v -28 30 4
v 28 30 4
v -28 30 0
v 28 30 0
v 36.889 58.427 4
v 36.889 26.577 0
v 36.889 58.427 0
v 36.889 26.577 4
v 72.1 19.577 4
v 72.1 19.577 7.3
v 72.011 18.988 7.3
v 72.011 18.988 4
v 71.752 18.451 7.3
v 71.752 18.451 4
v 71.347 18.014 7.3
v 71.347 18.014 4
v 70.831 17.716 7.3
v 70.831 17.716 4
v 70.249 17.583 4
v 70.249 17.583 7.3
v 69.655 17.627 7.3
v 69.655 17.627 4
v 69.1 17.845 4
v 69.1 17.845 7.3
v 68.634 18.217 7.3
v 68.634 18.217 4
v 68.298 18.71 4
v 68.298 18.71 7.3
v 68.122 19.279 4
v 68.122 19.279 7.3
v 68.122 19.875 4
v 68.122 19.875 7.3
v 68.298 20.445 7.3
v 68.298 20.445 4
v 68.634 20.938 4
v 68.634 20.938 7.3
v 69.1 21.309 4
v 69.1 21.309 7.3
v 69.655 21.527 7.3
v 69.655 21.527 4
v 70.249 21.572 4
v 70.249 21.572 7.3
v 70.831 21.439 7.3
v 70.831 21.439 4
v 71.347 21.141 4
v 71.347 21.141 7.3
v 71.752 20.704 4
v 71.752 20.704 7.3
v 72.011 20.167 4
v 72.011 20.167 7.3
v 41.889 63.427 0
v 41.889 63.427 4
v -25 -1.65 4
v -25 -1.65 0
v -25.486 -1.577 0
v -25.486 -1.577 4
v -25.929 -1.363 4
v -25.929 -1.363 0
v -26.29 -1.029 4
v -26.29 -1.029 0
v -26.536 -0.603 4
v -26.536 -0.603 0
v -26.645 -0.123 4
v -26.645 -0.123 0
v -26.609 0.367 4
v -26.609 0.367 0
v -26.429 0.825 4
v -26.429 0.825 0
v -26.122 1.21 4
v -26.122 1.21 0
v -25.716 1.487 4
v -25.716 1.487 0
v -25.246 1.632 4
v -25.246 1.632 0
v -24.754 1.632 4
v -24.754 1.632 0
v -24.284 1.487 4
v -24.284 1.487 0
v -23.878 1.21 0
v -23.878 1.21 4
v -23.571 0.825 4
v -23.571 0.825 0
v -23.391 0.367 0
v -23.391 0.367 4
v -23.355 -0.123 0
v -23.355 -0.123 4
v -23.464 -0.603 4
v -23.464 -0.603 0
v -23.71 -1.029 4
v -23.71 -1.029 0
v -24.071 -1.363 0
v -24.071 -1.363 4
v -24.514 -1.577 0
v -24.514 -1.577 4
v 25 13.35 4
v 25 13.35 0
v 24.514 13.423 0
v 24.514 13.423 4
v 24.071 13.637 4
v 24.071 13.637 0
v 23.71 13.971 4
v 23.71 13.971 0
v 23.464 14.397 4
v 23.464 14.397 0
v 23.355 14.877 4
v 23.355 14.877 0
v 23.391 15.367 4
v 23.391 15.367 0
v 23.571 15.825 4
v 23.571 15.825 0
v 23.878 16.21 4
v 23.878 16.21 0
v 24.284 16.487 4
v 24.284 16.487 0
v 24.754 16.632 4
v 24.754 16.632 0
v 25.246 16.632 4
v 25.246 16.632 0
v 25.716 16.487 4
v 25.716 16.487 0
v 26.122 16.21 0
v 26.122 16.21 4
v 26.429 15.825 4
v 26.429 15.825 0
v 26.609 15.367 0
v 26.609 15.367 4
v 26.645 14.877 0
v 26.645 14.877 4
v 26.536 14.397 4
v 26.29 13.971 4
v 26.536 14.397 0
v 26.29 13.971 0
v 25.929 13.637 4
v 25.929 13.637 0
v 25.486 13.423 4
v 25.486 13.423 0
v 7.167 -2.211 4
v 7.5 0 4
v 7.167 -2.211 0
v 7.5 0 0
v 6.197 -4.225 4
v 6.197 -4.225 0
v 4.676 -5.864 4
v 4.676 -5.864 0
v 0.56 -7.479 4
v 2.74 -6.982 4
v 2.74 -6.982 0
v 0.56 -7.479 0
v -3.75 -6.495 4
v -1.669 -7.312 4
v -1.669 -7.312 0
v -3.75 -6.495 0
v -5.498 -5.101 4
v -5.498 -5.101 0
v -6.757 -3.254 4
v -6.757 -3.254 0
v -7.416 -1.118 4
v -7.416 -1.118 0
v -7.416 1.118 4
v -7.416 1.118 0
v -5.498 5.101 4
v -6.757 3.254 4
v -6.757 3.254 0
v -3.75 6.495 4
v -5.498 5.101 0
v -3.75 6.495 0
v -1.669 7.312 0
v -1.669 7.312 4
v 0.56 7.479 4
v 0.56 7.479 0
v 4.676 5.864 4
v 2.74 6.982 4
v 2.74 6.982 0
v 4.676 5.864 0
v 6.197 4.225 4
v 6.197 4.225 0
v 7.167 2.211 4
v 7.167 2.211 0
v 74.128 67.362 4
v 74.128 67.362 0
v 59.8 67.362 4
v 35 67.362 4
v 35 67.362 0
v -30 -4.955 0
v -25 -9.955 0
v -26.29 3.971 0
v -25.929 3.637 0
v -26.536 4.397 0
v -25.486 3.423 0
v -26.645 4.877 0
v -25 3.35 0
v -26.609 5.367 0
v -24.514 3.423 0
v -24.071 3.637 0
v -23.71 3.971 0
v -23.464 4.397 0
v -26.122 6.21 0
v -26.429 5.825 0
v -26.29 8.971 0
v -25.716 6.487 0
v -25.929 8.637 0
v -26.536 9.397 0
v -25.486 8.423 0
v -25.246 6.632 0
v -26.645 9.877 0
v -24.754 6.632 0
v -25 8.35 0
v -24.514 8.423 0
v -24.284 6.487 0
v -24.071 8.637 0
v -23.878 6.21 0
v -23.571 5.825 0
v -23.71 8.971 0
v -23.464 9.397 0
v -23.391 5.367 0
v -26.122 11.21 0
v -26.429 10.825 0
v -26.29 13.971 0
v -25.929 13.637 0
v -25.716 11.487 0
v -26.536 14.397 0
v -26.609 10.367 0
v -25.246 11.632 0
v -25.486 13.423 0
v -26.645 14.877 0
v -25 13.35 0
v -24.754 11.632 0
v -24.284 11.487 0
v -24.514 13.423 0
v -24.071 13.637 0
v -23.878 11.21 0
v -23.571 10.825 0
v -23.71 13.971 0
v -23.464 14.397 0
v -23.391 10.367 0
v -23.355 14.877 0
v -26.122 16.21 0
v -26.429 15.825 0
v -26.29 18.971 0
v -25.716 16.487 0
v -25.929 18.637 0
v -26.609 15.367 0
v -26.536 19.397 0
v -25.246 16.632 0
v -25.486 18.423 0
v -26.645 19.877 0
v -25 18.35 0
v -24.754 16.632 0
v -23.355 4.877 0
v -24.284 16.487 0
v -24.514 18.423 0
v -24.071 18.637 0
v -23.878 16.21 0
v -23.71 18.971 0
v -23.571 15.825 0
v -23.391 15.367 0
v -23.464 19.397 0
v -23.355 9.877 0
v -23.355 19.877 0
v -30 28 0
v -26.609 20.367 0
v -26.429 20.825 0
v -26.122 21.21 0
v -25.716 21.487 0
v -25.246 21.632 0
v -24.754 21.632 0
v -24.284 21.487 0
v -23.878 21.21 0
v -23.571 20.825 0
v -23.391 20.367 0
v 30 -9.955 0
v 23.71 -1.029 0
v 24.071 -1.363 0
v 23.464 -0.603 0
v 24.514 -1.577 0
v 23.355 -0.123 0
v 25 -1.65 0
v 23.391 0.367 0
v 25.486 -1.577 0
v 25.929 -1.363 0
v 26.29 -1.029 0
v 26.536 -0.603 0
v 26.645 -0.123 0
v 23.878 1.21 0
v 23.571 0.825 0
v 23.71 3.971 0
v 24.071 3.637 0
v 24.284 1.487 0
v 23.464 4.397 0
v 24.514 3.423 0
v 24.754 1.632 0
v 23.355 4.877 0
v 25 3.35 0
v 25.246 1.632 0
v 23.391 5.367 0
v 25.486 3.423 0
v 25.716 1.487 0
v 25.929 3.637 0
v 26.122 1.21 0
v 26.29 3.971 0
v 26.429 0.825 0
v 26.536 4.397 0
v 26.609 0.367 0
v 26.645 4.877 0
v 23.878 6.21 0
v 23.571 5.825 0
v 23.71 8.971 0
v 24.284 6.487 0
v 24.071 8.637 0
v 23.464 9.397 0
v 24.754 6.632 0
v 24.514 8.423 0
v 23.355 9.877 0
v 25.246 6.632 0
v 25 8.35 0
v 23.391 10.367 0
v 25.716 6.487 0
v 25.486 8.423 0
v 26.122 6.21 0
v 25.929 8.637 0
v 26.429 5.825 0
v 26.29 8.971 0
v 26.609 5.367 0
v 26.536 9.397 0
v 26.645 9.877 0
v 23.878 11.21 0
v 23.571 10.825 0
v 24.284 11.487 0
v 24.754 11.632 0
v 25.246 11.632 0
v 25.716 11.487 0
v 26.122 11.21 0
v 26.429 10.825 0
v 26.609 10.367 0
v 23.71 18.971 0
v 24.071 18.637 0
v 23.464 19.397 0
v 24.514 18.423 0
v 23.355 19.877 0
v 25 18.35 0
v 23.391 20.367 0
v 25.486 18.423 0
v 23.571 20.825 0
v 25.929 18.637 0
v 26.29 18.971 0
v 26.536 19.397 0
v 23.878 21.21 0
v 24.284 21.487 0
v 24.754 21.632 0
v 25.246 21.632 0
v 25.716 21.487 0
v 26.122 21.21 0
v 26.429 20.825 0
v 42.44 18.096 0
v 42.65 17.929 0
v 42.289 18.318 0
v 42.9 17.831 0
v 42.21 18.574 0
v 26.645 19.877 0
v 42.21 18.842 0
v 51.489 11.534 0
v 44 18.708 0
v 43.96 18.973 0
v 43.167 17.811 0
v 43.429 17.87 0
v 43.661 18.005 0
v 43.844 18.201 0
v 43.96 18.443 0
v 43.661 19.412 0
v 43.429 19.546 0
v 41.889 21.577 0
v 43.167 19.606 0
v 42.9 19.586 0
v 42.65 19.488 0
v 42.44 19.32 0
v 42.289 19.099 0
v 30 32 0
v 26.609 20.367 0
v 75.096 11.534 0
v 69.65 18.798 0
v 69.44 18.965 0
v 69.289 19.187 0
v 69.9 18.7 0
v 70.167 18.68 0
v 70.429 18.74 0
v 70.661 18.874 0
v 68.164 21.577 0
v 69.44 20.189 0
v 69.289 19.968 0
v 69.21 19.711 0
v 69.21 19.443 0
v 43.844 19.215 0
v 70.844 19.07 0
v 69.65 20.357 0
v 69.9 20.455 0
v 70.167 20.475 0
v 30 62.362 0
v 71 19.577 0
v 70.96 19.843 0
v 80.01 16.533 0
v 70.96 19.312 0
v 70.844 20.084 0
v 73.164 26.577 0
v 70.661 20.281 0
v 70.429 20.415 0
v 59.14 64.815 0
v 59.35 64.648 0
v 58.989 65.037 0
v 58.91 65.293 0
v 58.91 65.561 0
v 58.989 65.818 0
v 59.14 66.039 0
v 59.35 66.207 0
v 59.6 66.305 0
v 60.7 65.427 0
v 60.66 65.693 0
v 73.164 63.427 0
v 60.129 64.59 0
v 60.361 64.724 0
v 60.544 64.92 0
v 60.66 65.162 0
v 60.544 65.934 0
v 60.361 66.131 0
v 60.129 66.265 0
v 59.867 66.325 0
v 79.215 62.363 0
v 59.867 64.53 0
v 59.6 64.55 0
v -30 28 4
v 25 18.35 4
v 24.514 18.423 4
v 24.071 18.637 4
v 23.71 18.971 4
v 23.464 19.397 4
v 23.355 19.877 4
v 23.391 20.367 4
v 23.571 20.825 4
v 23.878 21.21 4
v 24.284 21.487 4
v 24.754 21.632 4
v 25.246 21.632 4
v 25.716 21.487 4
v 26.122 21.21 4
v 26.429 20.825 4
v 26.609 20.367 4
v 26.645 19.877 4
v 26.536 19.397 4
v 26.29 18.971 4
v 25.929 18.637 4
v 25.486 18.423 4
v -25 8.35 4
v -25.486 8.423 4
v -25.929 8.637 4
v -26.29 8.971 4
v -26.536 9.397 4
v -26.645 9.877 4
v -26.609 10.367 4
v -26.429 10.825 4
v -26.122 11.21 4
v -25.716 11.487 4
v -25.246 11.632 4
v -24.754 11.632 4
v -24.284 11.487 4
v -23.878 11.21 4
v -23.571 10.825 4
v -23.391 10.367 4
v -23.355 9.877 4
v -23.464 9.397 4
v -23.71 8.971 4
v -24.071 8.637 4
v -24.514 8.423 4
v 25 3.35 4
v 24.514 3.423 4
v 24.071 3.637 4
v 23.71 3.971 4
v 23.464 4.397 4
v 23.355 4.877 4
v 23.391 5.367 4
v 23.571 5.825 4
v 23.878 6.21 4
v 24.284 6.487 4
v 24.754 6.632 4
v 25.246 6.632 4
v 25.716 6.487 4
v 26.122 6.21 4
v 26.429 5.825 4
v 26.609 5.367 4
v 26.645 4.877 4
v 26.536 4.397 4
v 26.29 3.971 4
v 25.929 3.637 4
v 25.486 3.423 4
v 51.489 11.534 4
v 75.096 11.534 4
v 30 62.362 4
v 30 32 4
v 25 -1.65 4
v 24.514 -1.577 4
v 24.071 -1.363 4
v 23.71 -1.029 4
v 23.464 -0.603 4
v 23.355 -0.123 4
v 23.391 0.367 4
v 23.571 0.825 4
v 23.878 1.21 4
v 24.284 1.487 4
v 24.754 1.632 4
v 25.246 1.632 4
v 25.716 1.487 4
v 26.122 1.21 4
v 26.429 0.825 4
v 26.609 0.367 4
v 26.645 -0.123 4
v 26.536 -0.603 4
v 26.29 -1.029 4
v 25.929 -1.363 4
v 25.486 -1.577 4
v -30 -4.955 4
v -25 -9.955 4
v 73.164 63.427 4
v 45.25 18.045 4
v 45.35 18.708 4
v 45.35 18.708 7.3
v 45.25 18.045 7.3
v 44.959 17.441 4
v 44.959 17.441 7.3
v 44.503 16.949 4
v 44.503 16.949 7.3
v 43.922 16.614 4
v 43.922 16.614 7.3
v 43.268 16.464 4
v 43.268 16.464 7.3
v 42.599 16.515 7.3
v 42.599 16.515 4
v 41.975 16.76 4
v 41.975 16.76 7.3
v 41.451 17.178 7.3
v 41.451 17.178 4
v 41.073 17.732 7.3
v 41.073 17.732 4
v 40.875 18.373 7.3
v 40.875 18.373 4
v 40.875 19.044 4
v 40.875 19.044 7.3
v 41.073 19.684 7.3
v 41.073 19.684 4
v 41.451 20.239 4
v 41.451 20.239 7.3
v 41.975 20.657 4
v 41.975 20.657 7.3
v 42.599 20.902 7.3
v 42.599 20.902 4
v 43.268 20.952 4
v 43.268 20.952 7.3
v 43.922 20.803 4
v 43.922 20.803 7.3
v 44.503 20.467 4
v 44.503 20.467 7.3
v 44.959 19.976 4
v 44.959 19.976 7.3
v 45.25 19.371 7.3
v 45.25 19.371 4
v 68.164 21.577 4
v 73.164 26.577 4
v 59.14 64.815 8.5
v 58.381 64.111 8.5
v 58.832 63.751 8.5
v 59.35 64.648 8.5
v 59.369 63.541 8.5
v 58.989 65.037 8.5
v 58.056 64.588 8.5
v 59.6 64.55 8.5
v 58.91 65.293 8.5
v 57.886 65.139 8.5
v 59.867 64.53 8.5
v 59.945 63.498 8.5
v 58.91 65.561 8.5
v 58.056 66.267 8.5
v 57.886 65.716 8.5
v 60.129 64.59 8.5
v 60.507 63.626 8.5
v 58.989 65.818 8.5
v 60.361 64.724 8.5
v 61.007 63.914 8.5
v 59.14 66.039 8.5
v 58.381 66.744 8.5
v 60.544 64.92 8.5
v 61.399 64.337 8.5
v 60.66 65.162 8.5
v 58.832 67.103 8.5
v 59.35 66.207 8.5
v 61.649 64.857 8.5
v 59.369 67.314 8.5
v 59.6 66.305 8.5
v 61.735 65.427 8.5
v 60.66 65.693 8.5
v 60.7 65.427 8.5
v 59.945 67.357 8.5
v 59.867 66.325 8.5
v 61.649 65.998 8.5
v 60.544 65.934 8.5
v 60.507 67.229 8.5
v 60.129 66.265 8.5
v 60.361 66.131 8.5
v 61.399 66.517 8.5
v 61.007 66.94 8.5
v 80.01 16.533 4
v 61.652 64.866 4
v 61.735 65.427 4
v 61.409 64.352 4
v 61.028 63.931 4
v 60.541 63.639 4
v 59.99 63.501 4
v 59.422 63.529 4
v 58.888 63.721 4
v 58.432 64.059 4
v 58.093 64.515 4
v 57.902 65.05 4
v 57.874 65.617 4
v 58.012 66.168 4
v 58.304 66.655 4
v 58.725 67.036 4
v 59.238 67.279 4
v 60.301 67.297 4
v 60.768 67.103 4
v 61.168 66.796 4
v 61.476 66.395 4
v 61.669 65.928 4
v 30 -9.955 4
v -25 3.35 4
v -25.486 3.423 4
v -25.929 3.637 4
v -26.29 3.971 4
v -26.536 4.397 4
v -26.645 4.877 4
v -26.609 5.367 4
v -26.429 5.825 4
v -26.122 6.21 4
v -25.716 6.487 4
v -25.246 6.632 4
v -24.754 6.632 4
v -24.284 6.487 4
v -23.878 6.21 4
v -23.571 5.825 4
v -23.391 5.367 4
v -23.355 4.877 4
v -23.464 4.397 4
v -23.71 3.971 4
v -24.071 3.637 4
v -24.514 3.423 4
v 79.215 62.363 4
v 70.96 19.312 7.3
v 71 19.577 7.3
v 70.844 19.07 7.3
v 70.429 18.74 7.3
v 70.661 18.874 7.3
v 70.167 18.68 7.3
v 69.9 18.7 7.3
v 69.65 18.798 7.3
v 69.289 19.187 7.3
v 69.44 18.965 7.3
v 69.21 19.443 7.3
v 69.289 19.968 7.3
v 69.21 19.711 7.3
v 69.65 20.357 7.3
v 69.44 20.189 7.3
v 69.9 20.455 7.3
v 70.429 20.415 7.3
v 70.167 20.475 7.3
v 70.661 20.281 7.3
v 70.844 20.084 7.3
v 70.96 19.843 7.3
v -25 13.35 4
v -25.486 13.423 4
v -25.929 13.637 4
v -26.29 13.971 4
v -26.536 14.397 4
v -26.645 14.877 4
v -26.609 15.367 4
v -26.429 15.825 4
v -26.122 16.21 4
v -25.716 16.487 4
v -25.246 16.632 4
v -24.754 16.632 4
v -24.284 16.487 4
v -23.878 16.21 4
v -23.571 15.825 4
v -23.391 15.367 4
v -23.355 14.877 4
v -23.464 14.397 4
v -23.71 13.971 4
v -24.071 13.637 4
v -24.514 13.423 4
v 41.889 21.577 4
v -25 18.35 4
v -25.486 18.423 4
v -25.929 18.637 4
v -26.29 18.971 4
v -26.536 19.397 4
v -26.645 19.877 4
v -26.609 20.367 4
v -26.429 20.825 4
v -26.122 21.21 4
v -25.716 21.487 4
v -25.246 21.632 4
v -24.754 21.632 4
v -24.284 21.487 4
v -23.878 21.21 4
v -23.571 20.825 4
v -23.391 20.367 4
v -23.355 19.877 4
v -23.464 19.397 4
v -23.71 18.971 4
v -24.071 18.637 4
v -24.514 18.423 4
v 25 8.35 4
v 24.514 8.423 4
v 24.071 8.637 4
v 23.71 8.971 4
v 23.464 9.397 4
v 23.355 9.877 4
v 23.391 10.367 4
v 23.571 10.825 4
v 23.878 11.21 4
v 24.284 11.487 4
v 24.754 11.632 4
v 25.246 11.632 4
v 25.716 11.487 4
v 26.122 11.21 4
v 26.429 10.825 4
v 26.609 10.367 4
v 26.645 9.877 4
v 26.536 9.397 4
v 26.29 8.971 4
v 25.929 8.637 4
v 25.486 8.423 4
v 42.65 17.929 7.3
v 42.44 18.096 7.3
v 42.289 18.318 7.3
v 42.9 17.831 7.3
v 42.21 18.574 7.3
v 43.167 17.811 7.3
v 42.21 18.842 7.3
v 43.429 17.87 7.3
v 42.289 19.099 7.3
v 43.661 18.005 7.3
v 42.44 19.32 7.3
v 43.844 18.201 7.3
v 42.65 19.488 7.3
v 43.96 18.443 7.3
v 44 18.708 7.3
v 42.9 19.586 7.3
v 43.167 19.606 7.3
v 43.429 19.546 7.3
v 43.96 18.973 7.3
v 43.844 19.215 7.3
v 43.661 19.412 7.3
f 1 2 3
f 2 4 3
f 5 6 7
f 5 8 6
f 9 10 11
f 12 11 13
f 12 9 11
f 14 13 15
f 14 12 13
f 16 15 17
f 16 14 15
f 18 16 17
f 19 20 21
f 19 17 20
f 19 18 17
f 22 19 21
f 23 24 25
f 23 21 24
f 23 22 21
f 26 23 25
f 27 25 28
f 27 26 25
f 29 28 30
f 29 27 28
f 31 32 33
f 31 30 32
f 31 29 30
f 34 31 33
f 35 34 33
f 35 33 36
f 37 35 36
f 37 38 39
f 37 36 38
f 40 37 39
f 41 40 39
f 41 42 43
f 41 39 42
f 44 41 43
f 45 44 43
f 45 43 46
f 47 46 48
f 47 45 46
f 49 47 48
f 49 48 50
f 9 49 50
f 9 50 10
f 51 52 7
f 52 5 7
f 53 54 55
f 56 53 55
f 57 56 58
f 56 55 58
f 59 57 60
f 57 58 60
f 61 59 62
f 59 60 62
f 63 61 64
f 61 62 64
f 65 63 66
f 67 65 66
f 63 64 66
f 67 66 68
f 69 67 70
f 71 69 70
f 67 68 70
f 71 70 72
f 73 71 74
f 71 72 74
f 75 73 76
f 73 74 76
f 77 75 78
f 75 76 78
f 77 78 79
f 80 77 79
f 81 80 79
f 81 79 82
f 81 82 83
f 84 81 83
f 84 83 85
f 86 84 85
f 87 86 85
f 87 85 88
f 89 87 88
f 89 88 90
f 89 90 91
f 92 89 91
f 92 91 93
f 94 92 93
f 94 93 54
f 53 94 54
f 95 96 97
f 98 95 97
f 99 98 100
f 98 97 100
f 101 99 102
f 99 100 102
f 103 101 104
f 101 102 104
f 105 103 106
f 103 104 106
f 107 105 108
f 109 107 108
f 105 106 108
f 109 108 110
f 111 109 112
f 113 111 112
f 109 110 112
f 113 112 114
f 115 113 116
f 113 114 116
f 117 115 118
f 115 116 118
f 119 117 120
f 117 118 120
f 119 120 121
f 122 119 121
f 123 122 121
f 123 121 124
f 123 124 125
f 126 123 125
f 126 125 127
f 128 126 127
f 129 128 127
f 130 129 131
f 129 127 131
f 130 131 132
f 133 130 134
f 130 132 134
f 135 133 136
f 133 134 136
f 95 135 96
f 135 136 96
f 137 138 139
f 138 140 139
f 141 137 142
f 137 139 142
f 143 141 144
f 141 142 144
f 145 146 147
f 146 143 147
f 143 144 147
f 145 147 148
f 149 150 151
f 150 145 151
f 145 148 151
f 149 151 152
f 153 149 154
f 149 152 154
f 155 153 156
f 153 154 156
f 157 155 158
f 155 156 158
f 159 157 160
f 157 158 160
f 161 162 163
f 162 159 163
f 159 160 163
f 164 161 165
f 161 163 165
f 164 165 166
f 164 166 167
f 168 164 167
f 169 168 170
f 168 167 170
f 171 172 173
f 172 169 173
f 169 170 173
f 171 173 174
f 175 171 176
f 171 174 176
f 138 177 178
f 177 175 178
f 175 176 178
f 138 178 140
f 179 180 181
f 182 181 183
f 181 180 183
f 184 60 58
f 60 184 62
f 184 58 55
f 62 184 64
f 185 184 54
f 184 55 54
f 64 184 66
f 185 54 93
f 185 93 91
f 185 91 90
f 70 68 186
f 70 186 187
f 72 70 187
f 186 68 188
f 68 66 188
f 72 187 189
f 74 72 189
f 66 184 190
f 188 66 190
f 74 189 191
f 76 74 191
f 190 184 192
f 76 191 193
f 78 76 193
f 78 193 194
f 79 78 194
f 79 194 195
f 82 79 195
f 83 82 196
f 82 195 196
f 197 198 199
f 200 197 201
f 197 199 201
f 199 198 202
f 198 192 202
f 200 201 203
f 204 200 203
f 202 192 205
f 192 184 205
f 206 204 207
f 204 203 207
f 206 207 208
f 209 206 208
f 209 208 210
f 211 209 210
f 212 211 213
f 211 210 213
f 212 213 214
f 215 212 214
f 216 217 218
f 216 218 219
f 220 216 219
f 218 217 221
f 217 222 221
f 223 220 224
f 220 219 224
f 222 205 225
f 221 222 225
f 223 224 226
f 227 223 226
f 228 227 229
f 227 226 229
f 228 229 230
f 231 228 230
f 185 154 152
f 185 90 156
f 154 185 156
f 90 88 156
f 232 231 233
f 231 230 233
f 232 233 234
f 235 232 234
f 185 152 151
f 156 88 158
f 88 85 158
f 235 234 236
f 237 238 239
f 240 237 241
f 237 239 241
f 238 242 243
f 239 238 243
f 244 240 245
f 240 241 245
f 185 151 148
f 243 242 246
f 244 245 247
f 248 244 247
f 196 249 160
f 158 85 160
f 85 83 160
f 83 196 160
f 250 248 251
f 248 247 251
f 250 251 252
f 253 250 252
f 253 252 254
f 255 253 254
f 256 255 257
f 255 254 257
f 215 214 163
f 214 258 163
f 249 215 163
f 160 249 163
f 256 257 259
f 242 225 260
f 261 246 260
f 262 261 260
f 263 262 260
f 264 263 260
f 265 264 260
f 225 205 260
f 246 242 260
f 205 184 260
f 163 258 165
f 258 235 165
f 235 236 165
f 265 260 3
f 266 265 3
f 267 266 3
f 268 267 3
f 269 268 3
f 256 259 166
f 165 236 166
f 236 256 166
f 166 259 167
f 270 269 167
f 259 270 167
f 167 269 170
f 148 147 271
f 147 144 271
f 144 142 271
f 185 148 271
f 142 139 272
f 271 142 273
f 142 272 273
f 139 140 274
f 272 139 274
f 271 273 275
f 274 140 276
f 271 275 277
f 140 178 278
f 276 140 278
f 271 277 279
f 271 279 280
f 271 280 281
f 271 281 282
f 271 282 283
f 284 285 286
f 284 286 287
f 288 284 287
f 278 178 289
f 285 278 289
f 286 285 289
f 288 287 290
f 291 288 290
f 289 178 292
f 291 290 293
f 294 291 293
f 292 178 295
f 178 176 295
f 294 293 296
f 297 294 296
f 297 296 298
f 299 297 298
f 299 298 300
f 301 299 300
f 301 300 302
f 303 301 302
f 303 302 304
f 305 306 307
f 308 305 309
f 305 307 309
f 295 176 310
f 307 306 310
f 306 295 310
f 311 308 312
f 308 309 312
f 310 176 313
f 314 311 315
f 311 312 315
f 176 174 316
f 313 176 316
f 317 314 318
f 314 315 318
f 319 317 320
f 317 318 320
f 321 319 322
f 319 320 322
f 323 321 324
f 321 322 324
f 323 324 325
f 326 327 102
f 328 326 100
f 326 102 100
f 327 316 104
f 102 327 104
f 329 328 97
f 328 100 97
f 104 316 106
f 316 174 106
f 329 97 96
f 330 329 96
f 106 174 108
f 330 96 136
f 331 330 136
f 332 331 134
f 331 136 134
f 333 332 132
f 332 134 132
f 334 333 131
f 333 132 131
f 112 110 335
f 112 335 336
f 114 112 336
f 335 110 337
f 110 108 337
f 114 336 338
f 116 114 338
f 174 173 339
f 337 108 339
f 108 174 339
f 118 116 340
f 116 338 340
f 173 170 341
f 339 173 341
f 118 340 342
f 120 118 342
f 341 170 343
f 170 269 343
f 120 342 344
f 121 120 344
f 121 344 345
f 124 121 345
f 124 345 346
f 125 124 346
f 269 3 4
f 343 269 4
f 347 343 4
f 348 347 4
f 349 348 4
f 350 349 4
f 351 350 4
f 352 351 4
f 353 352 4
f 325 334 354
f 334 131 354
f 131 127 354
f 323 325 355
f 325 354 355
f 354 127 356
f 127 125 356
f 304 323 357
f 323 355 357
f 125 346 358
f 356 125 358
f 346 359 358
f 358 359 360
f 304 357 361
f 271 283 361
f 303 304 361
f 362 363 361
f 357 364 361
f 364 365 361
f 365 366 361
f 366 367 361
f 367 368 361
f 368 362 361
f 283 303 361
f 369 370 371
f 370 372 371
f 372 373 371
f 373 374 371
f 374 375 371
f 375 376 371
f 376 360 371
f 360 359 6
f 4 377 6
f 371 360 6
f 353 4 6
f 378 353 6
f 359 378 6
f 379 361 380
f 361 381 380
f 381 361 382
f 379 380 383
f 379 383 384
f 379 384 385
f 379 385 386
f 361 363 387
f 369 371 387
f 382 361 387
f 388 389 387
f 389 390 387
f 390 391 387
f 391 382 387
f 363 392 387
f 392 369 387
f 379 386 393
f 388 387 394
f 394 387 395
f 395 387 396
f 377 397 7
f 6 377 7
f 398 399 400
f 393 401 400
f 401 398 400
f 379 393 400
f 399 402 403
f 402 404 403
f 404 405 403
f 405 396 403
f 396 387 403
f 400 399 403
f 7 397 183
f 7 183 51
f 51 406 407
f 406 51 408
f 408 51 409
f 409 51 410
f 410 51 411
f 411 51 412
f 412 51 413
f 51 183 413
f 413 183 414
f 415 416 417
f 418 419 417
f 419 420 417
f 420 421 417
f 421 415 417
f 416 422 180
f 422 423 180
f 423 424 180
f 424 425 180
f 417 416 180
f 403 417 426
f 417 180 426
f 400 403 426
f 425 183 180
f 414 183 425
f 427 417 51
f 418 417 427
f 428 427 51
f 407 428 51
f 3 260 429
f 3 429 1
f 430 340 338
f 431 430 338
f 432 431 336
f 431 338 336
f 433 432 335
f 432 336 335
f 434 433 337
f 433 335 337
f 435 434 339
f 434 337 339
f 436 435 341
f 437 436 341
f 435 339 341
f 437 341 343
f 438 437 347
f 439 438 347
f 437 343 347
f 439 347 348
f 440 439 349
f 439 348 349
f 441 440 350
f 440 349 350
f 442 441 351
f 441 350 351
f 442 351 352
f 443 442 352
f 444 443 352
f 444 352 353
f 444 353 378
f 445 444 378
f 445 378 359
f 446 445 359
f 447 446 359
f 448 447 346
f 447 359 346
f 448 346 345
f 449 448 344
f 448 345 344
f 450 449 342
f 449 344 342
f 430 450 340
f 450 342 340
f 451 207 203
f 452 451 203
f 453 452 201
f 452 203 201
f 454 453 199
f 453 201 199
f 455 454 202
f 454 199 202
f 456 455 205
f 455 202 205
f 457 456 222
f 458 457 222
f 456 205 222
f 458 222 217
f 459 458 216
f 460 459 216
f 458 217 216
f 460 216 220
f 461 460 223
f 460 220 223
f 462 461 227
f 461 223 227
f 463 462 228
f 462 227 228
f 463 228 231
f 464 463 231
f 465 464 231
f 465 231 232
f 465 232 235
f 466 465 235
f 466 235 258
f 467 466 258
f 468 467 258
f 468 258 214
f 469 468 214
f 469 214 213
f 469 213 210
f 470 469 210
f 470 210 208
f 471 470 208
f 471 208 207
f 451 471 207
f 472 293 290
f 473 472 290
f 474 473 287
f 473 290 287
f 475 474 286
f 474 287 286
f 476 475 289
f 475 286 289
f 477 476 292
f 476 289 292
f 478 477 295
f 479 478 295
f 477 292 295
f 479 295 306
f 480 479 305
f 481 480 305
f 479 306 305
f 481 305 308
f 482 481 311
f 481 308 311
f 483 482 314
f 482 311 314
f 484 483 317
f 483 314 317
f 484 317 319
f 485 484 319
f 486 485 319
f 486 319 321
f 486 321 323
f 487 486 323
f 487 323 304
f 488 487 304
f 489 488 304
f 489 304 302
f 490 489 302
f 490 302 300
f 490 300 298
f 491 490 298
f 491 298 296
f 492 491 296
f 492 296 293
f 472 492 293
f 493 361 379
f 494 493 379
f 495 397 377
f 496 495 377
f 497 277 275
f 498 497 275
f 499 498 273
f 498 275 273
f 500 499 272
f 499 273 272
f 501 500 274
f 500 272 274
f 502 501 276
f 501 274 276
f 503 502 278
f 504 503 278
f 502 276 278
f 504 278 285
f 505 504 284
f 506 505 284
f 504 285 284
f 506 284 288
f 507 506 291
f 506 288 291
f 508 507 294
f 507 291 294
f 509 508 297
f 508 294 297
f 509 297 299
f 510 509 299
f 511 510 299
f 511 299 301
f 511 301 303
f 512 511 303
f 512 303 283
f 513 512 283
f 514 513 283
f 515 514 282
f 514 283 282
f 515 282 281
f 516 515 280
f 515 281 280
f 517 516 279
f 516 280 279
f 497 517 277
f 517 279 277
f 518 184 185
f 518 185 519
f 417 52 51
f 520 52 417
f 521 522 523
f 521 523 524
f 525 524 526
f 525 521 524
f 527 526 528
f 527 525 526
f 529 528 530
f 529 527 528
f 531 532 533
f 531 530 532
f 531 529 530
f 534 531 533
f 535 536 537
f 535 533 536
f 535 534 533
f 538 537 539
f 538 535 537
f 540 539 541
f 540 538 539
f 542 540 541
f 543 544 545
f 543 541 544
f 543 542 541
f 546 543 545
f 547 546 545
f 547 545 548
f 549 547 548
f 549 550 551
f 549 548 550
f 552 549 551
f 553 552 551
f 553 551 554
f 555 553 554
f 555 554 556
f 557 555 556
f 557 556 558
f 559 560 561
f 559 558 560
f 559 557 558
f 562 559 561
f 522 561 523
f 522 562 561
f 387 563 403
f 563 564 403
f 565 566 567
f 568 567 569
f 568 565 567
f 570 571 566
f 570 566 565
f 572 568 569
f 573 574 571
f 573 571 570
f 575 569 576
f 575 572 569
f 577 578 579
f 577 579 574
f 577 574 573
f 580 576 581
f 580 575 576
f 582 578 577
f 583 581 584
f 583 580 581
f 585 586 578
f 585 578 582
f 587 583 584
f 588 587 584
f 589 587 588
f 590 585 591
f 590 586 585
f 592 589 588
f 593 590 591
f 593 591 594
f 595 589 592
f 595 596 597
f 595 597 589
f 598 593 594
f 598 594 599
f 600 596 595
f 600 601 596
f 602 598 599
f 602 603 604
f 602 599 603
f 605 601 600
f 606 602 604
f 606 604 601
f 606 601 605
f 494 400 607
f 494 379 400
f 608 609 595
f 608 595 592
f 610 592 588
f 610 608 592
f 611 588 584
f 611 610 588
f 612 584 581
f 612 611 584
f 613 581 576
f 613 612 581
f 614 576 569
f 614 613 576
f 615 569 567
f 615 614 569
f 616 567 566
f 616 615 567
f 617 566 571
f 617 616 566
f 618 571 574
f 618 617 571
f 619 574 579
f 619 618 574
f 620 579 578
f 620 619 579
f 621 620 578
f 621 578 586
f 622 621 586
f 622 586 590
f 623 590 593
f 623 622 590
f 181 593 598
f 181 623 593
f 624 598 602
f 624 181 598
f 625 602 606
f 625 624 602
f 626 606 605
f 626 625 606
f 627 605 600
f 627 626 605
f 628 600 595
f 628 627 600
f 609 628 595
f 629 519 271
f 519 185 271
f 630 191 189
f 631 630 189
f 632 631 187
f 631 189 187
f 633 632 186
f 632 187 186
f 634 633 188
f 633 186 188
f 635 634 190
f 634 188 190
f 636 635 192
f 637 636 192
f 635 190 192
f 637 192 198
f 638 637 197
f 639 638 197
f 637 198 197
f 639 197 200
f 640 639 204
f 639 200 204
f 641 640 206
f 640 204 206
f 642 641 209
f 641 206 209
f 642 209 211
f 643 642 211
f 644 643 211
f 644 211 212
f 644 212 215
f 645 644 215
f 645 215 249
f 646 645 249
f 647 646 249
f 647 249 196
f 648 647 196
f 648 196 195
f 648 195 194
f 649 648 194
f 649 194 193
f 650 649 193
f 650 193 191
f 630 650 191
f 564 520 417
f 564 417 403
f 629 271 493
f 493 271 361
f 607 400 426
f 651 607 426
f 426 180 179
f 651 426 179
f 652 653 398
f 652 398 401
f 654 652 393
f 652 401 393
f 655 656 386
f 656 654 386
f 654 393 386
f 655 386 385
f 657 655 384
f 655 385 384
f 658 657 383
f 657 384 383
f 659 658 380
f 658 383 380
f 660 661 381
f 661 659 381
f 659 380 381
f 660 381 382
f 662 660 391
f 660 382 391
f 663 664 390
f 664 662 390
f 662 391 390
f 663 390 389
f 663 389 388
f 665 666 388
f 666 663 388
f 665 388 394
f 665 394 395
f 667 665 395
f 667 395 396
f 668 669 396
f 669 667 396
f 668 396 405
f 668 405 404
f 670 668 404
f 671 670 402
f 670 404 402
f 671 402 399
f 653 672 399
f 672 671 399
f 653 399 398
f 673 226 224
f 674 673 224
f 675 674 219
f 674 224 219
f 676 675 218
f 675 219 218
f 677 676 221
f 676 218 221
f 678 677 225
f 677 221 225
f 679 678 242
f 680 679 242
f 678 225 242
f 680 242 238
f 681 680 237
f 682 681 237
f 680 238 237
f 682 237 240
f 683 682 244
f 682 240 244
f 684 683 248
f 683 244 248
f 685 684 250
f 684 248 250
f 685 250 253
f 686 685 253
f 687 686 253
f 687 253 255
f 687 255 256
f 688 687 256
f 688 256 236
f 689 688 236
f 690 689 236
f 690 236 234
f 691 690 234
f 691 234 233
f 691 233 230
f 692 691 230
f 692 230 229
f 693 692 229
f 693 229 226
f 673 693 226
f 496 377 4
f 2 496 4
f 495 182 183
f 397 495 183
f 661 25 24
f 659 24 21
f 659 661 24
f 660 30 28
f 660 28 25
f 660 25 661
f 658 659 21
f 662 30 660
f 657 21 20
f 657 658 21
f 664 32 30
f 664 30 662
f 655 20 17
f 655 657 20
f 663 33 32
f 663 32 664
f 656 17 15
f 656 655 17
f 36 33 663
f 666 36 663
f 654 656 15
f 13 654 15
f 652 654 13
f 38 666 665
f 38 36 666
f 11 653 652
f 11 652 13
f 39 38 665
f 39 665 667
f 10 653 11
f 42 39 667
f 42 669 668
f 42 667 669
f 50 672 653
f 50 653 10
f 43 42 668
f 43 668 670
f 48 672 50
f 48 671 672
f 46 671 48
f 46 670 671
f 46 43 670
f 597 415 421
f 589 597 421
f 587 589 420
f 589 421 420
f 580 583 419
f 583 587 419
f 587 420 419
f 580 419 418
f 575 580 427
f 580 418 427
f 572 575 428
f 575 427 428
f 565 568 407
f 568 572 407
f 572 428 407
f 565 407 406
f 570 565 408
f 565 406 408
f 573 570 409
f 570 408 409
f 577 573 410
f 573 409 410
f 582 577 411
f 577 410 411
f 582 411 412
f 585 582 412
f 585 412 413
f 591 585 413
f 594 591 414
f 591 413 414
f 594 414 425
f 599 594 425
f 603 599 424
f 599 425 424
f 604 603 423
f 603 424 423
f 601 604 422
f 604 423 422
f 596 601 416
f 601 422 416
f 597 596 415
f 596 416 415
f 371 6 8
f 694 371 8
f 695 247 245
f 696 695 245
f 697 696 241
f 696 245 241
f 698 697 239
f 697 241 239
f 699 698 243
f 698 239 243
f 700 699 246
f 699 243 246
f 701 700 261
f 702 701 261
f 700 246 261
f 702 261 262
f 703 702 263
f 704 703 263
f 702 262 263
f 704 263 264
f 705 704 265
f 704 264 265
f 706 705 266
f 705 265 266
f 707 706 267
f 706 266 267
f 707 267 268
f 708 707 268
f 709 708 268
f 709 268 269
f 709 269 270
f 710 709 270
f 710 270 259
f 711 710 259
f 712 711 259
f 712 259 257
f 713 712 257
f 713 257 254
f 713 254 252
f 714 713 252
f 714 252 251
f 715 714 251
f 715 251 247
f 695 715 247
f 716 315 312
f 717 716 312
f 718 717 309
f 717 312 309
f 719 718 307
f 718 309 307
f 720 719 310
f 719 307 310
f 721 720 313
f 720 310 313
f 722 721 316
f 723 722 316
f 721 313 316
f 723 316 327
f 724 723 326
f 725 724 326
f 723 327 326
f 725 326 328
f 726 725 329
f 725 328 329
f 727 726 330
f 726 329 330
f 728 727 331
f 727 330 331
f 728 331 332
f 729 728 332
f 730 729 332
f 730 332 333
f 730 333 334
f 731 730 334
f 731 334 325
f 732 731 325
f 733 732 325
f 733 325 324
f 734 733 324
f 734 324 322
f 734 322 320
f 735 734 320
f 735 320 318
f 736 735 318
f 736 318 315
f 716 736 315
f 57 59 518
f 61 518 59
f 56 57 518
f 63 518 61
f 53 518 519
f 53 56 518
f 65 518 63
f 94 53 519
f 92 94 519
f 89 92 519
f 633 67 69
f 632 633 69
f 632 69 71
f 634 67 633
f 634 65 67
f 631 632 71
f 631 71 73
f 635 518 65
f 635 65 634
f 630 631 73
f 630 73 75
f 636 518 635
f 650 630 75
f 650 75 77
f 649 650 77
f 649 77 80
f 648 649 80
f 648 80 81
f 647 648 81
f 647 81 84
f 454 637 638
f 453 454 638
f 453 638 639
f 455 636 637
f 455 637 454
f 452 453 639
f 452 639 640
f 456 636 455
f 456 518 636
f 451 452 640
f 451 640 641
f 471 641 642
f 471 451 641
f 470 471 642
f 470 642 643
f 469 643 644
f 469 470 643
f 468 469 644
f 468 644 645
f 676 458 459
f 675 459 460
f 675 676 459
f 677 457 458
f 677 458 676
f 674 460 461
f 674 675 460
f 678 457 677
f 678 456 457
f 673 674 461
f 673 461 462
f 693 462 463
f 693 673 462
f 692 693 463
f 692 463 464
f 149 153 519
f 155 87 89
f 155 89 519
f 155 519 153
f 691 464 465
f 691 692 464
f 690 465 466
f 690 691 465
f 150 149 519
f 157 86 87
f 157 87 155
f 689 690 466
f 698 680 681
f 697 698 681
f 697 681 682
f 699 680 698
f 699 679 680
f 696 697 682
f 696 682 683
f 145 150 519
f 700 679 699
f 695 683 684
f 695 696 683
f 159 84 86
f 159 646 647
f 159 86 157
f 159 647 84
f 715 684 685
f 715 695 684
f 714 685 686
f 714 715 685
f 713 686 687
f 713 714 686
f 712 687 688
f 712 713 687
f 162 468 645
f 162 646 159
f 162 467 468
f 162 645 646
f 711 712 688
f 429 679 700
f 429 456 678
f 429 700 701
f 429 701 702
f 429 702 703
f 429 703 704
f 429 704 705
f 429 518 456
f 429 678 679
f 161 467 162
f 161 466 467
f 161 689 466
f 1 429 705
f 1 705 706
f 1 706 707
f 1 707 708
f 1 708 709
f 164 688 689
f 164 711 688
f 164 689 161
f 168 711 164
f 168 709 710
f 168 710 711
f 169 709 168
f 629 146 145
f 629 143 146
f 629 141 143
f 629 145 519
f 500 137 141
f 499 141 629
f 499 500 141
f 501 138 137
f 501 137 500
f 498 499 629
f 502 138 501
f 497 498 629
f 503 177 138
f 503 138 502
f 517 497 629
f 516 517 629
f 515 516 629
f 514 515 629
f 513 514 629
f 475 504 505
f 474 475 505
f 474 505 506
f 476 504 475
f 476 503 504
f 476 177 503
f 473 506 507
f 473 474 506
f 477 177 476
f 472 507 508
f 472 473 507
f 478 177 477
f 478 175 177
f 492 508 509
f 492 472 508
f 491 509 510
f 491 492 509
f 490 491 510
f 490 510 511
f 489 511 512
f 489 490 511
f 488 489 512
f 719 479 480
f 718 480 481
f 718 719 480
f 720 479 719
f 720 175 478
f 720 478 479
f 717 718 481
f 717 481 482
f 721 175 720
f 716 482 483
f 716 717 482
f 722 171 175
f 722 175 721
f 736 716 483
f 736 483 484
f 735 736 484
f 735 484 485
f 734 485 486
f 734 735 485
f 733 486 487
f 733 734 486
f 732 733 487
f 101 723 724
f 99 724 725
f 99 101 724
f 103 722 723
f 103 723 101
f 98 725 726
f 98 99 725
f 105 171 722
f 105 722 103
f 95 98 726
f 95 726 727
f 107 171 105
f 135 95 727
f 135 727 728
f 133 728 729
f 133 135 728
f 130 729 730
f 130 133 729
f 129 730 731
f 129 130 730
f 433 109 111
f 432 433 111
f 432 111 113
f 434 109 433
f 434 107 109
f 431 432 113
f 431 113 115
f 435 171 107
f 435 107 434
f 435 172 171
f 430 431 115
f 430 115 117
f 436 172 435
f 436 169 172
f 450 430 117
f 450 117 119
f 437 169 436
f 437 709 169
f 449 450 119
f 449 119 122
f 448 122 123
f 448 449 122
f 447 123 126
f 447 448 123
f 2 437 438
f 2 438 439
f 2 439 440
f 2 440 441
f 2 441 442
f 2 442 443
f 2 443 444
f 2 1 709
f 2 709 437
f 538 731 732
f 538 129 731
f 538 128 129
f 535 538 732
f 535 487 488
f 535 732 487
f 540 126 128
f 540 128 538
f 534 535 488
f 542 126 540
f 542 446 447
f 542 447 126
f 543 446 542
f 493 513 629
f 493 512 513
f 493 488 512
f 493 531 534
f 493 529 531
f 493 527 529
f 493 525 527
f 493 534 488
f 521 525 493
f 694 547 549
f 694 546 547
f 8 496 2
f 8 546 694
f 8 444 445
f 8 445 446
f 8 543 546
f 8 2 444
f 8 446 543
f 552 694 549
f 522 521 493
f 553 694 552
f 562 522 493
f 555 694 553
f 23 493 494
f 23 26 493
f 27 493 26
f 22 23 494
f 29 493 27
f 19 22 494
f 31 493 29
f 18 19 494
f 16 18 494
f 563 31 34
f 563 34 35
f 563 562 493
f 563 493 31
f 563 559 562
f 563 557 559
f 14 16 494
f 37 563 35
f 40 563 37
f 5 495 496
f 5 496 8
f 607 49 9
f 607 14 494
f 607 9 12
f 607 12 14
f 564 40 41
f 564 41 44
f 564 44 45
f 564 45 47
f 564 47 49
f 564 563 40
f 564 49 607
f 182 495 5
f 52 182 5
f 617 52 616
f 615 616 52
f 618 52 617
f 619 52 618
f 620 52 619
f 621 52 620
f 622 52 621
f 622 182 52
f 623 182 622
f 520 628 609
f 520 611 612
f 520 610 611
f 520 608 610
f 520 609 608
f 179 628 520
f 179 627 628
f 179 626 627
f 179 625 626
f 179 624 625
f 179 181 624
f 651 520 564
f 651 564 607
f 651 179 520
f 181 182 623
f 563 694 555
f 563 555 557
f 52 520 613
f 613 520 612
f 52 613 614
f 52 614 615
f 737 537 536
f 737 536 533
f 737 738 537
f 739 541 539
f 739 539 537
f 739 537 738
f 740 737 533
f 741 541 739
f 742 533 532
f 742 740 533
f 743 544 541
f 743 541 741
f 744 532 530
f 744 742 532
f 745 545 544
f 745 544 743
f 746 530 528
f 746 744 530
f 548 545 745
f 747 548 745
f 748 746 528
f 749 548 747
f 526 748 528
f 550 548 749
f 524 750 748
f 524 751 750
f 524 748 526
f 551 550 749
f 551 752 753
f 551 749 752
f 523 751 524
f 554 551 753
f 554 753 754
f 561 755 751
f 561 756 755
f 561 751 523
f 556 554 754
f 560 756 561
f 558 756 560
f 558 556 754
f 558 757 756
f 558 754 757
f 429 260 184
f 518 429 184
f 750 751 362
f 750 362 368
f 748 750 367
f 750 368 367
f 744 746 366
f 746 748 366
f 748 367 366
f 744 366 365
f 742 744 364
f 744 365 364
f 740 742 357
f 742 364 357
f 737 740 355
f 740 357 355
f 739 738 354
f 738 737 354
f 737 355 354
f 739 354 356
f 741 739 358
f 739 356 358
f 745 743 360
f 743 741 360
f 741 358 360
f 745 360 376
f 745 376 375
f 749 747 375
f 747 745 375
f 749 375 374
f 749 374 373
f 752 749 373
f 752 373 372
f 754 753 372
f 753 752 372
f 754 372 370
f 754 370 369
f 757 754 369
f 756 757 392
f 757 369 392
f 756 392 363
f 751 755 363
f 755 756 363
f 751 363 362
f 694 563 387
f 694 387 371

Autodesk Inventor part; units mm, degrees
ref_plane "Work Plane1" through (0, 0, 0) normal (0, 0, 1) x (1, 0, 0)
sketch "Sketch1" plane through (0, 0, 0) normal (0, 0, 1) x (1, 0, 0)
  line L0 (28, 30) -> (30, 28) projected
  line L1 (28, 30) -> (-28, 30) projected
  line L2 (-30, 28) -> (-28, 30) projected
  line L3 (-30, 28) -> (-30, -28) projected
  line L4 (-28, -30) -> (-30, -28) projected
  line L5 (-28, -30) -> (28, -30) projected
  line L6 (30, -28) -> (28, -30) projected
  line L7 (30, -28) -> (30, 28) projected
  circle A0 centre (25, 0) radius 1.3 projected
  circle A1 centre (-25, 0) radius 1.3 projected
  circle A2 centre (0, 0) radius 7.5 projected
  line L8 (-30, -9.9552) -> (30, -9.9552)
  line L9 (30, -9.9552) -> (51.4888, 11.5337)
  line L10 (30, -9.9552) -> (60.3898, -9.9552) construction
  line L11 (51.4888, 11.5337) -> (80.0964, 11.5337)
  line L12 (80.0964, 11.5337) -> (79.128, 67.3625)
  line L13 (79.128, 67.3625) -> (30, 67.3625)
  line L14 (30, 67.3625) -> (30, 32)
  line L15 (30, 32) -> (28, 30)
  line L16 (30, 7.5) -> (36.7448, 7.5)
  line L17 (36.7448, 7.5) -> (36.7448, 15.7942)
  line L18 (36.7448, 15.7942) -> (73.91, 15.7942)
  line L19 (73.91, 15.7942) -> (73.91, 58.2218)
  line L20 (73.91, 58.2218) -> (36.7448, 58.2218)
  line L21 (36.7448, 58.2218) -> (36.7448, 32)
  line L22 (36.7448, 32) -> (36.7448, 15.7942)
  circle A3 centre (59.8, 65.4273) radius 0.9 projected
  circle A4 centre (43.1, 18.7082) radius 0.9 projected
  circle A5 centre (70.1, 19.5773) radius 0.9 projected
  point P0 (0, 0)
  point P1 (52.8328, 67.3625)
  dimension "d0" = 45
extrude "Extrusion1" add sketch "Sketch1" along normal blind 4 contours L22 L21 L20 L19 L18 | L15 L14 L13 L12 L11 L9 L7 L0 | L0 L7 L8 L3 L2 L1
sketch "Sketch2" plane through (0, 0, 4) normal (0, 0, 1) x (1, 0, 0)
  circle A0 centre (43.1, 18.7082) radius 2.25
  circle A1 centre (59.8, 65.4273) radius 0.9 projected
  circle A2 centre (59.8, 65.4273) radius 1.9352
  line L0 (79.128, 67.3625) -> (30, 67.3625) projected
  circle A3 centre (70.1, 19.5773) radius 2
  circle A4 centre (43.1, 13.7082) radius 0.9
  circle A5 centre (70.1, 14.5773) radius 0.9
  circle A6 centre (59.8, 60.4273) radius 0.9
  circle A7 centre (70.1, 19.5773) radius 0.9
  circle A8 centre (43.1, 18.7082) radius 0.9
  point P0 (0, 0)
  dimension "d4" = 4.5
  dimension "d5" = 4
ref_plane "Work Plane2" through (65, 14.0254, 8.3) normal (0, 0, 1) x (1, 0, 0)
ref_plane "Work Plane3" through (41, 13.4694, 7.3) normal (0, 0, -1) x (0, 1, 0)
extrude "Extrusion2" add sketch "Sketch2" along normal up to surface (3.3 mm away) contours A0 | A2 | A3
sketch "Sketch3" plane through (59.8, 65.4273, 7.3) normal (0, 0, 1) x (1, 0, 0)
  circle A0 centre (0, 0) radius 1.9352 projected
  circle A1 centre (0, 0) radius 0.9 projected
  point P0 (-59.8, -65.4273)
ref_plane "Work Plane4" through (52.7, 52.6273, 8.5) normal (0, 0, -1) x (0, 1, 0)
extrude "Extrusion3" add sketch "Sketch3" along normal up to surface (1.2 mm away)
sketch "Sketch4" plane through (0, 0, 4) normal (0, 0, 1) x (1, 0, 0)
  arc A0 (45.1, 18.7082) -> (41.5, 19.9082) centre (43.1, 18.7082) ccw projected
  circle A1 centre (70.1, 19.5773) radius 2 projected
  circle A2 centre (59.8, 65.4273) radius 1.9352 projected
  line L0 (73.1637, 21.5773) -> (36.8888, 21.5773)
  line L1 (36.8888, 21.5773) -> (36.8888, 63.4273)
  line L2 (36.8888, 63.4273) -> (73.1637, 63.4273)
  line L3 (73.1637, 63.4273) -> (73.1637, 21.5773)
  point P0 (0, 0)
extrude "Extrusion4" cut sketch "Sketch4" against normal blind 4 contours L0 L1 L2 L3
chamfer "Chamfer1" distance 5 angle 45 7 edges at (36.8888, 63.4273, 2) (36.8888, 21.5773, 2) (30, 67.3625, 2) (73.1637, 21.5773, 2) (79.128, 67.3625, 2) (80.0964, 11.5337, 2) (-30, -9.9552, 2)
sketch "Sketch5" plane through (0, 0, 4) normal (0, 0, 1) x (1, 0, 0)
  circle A0 centre (-25, 0) radius 1.3 projected
  circle A1 centre (25, 0) radius 1.3 projected
  point P0 (0, 0)
hole "Hole1" at (-25, 0, 4) at (25, 0, 4) direction (0, 0, -1) diameter 3.3 depth 8 tip angle 118
pattern_linear "Rectangular Pattern1" count 5 spacing 5 along (0, 1, 0) of "Hole1"
properties part number "10_MiniSPIM_XY_Stageplate"
